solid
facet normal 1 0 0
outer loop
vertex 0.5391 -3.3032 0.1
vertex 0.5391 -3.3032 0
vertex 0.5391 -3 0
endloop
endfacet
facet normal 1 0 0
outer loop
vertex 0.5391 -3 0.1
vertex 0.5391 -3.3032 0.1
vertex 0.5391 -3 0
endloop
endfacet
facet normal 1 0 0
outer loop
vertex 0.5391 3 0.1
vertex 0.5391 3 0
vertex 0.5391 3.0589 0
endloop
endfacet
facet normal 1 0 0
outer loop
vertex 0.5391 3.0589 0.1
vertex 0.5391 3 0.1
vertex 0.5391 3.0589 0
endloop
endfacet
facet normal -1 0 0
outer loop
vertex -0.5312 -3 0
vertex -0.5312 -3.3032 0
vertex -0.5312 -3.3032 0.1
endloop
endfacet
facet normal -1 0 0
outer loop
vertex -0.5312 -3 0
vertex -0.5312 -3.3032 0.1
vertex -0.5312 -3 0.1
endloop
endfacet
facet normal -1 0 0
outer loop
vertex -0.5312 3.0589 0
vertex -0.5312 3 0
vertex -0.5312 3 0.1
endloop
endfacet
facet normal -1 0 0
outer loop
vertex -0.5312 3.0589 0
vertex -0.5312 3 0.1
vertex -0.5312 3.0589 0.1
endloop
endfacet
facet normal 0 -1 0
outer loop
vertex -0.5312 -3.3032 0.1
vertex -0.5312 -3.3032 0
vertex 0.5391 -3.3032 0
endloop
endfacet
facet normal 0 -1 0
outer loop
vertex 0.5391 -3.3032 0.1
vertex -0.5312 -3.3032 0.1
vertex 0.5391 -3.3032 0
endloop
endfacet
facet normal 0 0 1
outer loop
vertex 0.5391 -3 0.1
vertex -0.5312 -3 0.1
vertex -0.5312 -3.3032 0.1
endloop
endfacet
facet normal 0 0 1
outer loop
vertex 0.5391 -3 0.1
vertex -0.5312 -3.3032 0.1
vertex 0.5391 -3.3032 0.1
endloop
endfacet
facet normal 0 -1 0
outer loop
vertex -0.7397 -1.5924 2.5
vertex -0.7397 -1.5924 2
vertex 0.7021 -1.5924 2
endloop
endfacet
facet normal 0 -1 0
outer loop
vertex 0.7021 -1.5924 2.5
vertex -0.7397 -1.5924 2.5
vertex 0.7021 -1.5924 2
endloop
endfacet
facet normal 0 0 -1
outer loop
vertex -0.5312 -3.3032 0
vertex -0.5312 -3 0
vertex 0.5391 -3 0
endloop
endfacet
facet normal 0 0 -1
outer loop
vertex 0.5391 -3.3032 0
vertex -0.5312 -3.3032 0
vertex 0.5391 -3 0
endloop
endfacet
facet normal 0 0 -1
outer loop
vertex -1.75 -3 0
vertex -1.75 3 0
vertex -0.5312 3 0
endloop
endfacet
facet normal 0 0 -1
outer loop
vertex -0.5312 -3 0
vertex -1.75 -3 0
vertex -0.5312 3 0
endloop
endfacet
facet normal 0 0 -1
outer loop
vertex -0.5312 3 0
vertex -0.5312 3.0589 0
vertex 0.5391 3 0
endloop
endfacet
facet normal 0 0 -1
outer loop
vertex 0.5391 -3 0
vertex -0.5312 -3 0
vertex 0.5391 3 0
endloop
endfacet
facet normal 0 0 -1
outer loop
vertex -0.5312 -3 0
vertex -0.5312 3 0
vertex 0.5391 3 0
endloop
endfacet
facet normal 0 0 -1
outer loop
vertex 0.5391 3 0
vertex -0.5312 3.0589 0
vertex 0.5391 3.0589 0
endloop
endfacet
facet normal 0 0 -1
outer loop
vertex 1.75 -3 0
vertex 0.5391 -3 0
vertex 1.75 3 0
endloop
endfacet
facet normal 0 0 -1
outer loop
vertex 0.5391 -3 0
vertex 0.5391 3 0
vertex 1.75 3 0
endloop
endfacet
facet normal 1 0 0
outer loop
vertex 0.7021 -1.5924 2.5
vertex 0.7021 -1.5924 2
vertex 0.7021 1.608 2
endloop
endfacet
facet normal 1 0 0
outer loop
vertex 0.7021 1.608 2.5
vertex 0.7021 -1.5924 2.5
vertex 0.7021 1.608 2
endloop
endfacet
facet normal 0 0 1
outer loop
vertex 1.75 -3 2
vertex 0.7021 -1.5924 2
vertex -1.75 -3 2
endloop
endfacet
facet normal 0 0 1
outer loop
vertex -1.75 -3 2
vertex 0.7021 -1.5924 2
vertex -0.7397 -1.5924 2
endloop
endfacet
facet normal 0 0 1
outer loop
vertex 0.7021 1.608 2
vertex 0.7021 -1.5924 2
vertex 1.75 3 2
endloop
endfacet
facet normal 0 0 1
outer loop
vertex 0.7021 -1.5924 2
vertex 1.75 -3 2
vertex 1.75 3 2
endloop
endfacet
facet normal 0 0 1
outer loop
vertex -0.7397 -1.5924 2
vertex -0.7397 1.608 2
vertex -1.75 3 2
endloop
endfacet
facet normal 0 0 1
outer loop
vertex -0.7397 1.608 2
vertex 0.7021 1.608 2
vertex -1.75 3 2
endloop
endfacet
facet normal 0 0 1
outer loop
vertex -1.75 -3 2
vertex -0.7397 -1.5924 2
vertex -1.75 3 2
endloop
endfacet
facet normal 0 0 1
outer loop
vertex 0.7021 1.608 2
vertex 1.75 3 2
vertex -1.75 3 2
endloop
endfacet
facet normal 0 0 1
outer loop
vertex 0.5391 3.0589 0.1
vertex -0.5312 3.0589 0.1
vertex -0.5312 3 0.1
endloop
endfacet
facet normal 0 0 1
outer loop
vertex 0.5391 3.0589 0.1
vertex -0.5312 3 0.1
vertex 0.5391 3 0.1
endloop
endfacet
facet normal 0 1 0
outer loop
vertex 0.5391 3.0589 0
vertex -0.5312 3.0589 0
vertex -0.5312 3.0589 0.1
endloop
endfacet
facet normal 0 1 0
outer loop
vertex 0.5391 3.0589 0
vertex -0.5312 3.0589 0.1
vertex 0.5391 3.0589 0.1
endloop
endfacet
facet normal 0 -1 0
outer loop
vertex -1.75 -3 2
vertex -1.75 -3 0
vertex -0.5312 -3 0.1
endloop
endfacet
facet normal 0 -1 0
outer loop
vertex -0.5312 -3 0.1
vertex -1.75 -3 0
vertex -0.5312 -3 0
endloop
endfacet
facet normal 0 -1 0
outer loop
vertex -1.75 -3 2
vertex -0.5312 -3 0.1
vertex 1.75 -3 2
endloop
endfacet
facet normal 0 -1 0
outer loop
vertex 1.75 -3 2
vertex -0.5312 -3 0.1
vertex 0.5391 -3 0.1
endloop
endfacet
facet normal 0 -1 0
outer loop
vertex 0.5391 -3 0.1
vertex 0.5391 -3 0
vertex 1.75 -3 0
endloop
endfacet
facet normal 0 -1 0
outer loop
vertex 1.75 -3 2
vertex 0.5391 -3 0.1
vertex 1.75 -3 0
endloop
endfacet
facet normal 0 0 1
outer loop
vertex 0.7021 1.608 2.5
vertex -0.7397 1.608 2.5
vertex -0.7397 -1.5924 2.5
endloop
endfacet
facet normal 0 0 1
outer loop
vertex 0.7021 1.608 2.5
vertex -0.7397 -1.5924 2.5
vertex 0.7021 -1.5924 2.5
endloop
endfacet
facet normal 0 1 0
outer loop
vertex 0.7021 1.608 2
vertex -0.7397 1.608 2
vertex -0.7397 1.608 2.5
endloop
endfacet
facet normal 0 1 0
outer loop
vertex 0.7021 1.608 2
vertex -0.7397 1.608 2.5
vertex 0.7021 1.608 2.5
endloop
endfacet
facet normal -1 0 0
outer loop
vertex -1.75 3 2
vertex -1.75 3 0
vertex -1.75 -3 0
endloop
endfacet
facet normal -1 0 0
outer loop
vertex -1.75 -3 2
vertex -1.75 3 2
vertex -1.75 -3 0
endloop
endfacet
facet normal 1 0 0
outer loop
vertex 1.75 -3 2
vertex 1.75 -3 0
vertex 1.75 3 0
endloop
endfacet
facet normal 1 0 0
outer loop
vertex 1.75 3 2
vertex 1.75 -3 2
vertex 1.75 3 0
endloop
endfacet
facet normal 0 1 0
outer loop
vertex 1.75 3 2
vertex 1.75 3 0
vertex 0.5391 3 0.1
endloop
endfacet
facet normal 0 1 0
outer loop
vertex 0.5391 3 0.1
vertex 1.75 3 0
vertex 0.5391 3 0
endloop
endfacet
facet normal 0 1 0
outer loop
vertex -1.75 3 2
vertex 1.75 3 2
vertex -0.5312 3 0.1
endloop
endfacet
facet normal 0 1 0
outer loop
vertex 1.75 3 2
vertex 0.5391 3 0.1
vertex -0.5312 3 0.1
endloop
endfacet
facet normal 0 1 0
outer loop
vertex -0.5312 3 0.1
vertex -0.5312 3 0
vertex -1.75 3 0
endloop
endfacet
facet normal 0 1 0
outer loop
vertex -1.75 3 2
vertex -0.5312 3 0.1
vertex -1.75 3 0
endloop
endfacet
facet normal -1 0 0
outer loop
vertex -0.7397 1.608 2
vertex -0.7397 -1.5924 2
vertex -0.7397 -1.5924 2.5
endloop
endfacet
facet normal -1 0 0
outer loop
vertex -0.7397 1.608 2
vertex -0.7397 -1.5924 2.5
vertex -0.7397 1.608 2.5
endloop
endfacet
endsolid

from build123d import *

# Parameters (mm, degrees)
PAD_DEPTH    = 2
SKETCH001_W  = 1.441815
SKETCH001_H  = 3.200363
PAD001_DEPTH = 0.5
SKETCH002_W  = 1.070261
SKETCH002_H  = 6.362106
PAD002_DEPTH = 0.1


with BuildPart() as part:
    # Sketch → Pad (new body)
    with BuildSketch(Plane.XY):
        Polygon((0, 3), (1.75, 3), (1.75, 0), (1.75, -3), (0, -3), (-1.75, -3), (-1.75, 0), (-1.75, 3), align=None)
    extrude(amount=PAD_DEPTH)

    # Sketch001 → Pad001 (join)
    with BuildSketch(Plane(origin=(0.5, -2.5, 2), x_dir=(1, 0, 0), z_dir=(0, 0, 1))):
        with Locations((-0.51884, 2.507786)):
            Rectangle(SKETCH001_W, SKETCH001_H)
    extrude(amount=PAD001_DEPTH)

    # Sketch002 → Pad002 (join)
    with BuildSketch(Plane.XY):
        with Locations((0.003927, -0.122119)):
            Rectangle(SKETCH002_W, SKETCH002_H)
    extrude(amount=PAD002_DEPTH)


solid = part.part
